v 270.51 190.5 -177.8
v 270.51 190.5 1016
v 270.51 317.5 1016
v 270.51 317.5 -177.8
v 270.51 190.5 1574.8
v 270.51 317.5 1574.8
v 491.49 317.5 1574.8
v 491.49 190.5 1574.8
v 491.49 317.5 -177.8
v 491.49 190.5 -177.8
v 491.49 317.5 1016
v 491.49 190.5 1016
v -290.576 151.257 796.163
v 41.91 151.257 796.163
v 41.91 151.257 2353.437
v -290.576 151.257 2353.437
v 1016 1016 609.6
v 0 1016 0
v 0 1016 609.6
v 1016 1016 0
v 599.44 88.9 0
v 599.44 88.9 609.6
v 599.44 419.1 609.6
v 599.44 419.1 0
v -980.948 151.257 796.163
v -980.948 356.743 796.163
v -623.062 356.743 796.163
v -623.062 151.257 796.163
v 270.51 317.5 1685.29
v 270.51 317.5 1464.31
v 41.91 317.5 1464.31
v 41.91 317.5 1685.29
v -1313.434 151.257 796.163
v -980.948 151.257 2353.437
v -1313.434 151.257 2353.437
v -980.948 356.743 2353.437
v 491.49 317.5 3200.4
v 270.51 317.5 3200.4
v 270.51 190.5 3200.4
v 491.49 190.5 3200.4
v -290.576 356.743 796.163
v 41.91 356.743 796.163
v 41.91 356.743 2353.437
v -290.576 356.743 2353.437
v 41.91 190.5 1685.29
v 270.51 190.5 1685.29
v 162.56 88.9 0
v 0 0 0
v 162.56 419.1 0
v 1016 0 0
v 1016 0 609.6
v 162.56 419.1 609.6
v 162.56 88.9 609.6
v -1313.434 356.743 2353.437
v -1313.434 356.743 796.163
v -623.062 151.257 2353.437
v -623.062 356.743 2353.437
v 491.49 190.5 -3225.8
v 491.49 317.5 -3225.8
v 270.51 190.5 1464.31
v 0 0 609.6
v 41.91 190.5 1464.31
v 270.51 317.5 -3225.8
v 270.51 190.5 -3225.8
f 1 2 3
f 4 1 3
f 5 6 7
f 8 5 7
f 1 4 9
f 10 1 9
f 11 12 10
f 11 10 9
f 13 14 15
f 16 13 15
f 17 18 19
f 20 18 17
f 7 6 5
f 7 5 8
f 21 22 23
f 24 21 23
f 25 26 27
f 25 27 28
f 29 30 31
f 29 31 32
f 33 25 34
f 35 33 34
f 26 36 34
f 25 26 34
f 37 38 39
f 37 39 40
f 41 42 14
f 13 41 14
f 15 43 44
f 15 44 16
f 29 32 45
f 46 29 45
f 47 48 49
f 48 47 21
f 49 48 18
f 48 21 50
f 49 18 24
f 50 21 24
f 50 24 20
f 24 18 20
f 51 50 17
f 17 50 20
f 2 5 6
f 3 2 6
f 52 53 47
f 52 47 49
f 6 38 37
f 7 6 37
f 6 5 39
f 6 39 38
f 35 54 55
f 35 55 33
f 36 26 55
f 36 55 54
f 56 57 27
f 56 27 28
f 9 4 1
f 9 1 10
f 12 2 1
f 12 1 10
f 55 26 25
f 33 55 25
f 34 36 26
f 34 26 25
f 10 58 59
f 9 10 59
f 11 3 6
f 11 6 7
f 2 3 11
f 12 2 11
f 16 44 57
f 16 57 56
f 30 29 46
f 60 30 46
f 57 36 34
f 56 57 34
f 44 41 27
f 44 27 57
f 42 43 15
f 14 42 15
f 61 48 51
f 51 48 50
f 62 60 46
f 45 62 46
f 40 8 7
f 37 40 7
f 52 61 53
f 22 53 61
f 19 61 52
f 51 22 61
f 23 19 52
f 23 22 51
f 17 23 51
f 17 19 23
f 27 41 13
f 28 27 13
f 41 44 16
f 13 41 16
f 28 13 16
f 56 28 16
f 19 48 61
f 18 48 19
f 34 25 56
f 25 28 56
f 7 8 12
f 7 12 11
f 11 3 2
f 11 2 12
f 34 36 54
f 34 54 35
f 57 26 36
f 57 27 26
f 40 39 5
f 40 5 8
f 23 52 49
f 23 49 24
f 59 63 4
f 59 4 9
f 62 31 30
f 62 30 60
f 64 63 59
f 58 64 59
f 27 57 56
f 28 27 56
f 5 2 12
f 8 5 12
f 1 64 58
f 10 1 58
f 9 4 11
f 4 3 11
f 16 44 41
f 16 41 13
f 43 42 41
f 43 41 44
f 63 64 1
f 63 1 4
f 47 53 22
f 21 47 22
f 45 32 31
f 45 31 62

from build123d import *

# Parameters (mm, degrees)
F0_W      = 1016
F0_H      = 1016
F1_DEPTH  = 609.6
F2_W      = 436.88
F2_H      = 330.2
F2_W_2    = 220.98
F2_H_2    = 127
F3_DEPTH  = 609.601
F4_DEPTH  = 762
F5_DEPTH  = 1168.4
F6_DEPTH  = 431.8
F7_DEPTH  = 1193.8
F8_DEPTH  = 406.4
F9_DEPTH  = 1320.8
F10_DEPTH = 177.8
F11_DEPTH = 3048
F12_DEPTH = 3048
F13_DEPTH = 2489.2
F14_DEPTH = 1625.6
F15_W     = 127
F15_H     = 220.98
F16_DEPTH = 228.6
F17_W     = 205.486
F17_H     = 1557.274
F18_DEPTH = 332.486
F19_DEPTH = 332.486
F20_DEPTH = 332.486
F21_DEPTH = 25.4
F22_DEPTH = 332.486


with BuildPart() as f1:
    # F0 (on Top) → F1 (new body)
    with BuildSketch(Plane.XY):
        with Locations((508, 508)):
            Rectangle(F0_W, F0_H)
    extrude(amount=F1_DEPTH)

    # F2 (on face) → F3 (cut, through all)
    with BuildSketch(Plane.XY.offset(609.6)):
        with Locations((381, 254)):
            Rectangle(F2_W, F2_H)
        with Locations((381, 254)):
            Rectangle(F2_W_2, F2_H_2, mode=Mode.SUBTRACT)
        with Locations((381, 254)):
            Rectangle(F2_W_2, F2_H_2)
    extrude(amount=-F3_DEPTH, mode=Mode.SUBTRACT)


with BuildPart() as f4:
    # F2 (on face) → F4 (new body, symmetric)
    with BuildSketch(Plane.XY.offset(609.6)):
        with Locations((381, 254)):
            Rectangle(F2_W_2, F2_H_2)
    extrude(amount=F4_DEPTH, both=True)

    # F5 (add): a face of the model
    f5_faces = [f4.faces().sort_by_distance(p)[0] for p in [
        (381, 254, -152.4),
    ]]
    extrude(f5_faces, amount=F5_DEPTH)

    # F6 (add): a face of the model
    f6_faces = [f4.faces().sort_by_distance(p)[0] for p in [
        (381, 254, 1371.6),
    ]]
    extrude(f6_faces, amount=F6_DEPTH)

    # F7 (cut, through all): a face of the model
    f7_faces = [f4.faces().sort_by_distance(p)[0] for p in [
        (381, 254, 1803.4),
    ]]
    extrude(f7_faces, amount=-F7_DEPTH, mode=Mode.SUBTRACT)

    # F8 (add): a face of the model
    f8_faces = [f4.faces().sort_by_distance(p)[0] for p in [
        (381, 254, 609.6),
    ]]
    extrude(f8_faces, amount=F8_DEPTH)

    # F9 (cut, through all): a face of the model
    f9_faces = [f4.faces().sort_by_distance(p)[0] for p in [
        (381, 254, -1320.8),
    ]]
    extrude(f9_faces, amount=-F9_DEPTH, mode=Mode.SUBTRACT)

    # F10 (add): a face of the model
    f10_faces = [f4.faces().sort_by_distance(p)[0] for p in [
        (381, 254, 0),
    ]]
    extrude(f10_faces, amount=F10_DEPTH)


with BuildPart() as f11:
    # F11 (new): a face of the model
    f11_faces = [f4.part.faces().sort_by_distance(p)[0] for p in [
        (381, 254, 1016),
    ]]
    extrude(f11_faces, amount=F11_DEPTH)

    # F13 (cut): a face of the model
    f13_faces = [f11.faces().sort_by_distance(p)[0] for p in [
        (381, 254, 4064),
    ]]
    extrude(f13_faces, amount=-F13_DEPTH, mode=Mode.SUBTRACT)


with BuildPart() as f12:
    # F12 (new): a face of the model
    f12_faces = [f4.part.faces().sort_by_distance(p)[0] for p in [
        (381, 254, -177.8),
    ]]
    extrude(f12_faces, amount=F12_DEPTH)


with BuildPart() as f14:
    # F14 (new): a face of the model
    f14_faces = [f11.part.faces().sort_by_distance(p)[0] for p in [
        (381, 254, 1574.8),
    ]]
    extrude(f14_faces, amount=F14_DEPTH)


with BuildPart() as f16:
    # F15 (on face) → F16 (new body)
    with BuildSketch(Plane(origin=(270.51, 0, 0), x_dir=(0, -1, 0), z_dir=(-1, 0, 0))):
        with Locations((-254, 1574.8)):
            Rectangle(F15_W, F15_H)
    extrude(amount=F16_DEPTH)


with BuildPart() as f18:
    # F17 (on face) → F18 (new body)
    with BuildSketch(Plane(origin=(41.91, 0, 0), x_dir=(0, -1, 0), z_dir=(-1, 0, 0))):
        with Locations((-254, 1574.8)):
            Rectangle(F17_W, F17_H)
    extrude(amount=F18_DEPTH)


with BuildPart() as f19:
    # F19 (new): a face of the model
    f19_faces = [f18.part.faces().sort_by_distance(p)[0] for p in [
        (-290.576, 254, 1574.8),
    ]]
    extrude(f19_faces, amount=F19_DEPTH)


with BuildPart() as f20:
    # F20 (new): a face of the model
    f20_faces = [f19.part.faces().sort_by_distance(p)[0] for p in [
        (-623.062, 254, 1574.8),
    ]]
    extrude(f20_faces, amount=F20_DEPTH)

    # F21 (add): a face of the model
    f21_faces = [f20.faces().sort_by_distance(p)[0] for p in [
        (-955.548, 254, 1574.8),
    ]]
    extrude(f21_faces, amount=F21_DEPTH)


with BuildPart() as f22:
    # F22 (new): a face of the model
    f22_faces = [f20.part.faces().sort_by_distance(p)[0] for p in [
        (-980.948, 254, 1574.8),
    ]]
    extrude(f22_faces, amount=F22_DEPTH)


solid = Compound([f1.part, f4.part, f11.part, f12.part, f14.part, f16.part, f18.part, f19.part, f20.part, f22.part])
